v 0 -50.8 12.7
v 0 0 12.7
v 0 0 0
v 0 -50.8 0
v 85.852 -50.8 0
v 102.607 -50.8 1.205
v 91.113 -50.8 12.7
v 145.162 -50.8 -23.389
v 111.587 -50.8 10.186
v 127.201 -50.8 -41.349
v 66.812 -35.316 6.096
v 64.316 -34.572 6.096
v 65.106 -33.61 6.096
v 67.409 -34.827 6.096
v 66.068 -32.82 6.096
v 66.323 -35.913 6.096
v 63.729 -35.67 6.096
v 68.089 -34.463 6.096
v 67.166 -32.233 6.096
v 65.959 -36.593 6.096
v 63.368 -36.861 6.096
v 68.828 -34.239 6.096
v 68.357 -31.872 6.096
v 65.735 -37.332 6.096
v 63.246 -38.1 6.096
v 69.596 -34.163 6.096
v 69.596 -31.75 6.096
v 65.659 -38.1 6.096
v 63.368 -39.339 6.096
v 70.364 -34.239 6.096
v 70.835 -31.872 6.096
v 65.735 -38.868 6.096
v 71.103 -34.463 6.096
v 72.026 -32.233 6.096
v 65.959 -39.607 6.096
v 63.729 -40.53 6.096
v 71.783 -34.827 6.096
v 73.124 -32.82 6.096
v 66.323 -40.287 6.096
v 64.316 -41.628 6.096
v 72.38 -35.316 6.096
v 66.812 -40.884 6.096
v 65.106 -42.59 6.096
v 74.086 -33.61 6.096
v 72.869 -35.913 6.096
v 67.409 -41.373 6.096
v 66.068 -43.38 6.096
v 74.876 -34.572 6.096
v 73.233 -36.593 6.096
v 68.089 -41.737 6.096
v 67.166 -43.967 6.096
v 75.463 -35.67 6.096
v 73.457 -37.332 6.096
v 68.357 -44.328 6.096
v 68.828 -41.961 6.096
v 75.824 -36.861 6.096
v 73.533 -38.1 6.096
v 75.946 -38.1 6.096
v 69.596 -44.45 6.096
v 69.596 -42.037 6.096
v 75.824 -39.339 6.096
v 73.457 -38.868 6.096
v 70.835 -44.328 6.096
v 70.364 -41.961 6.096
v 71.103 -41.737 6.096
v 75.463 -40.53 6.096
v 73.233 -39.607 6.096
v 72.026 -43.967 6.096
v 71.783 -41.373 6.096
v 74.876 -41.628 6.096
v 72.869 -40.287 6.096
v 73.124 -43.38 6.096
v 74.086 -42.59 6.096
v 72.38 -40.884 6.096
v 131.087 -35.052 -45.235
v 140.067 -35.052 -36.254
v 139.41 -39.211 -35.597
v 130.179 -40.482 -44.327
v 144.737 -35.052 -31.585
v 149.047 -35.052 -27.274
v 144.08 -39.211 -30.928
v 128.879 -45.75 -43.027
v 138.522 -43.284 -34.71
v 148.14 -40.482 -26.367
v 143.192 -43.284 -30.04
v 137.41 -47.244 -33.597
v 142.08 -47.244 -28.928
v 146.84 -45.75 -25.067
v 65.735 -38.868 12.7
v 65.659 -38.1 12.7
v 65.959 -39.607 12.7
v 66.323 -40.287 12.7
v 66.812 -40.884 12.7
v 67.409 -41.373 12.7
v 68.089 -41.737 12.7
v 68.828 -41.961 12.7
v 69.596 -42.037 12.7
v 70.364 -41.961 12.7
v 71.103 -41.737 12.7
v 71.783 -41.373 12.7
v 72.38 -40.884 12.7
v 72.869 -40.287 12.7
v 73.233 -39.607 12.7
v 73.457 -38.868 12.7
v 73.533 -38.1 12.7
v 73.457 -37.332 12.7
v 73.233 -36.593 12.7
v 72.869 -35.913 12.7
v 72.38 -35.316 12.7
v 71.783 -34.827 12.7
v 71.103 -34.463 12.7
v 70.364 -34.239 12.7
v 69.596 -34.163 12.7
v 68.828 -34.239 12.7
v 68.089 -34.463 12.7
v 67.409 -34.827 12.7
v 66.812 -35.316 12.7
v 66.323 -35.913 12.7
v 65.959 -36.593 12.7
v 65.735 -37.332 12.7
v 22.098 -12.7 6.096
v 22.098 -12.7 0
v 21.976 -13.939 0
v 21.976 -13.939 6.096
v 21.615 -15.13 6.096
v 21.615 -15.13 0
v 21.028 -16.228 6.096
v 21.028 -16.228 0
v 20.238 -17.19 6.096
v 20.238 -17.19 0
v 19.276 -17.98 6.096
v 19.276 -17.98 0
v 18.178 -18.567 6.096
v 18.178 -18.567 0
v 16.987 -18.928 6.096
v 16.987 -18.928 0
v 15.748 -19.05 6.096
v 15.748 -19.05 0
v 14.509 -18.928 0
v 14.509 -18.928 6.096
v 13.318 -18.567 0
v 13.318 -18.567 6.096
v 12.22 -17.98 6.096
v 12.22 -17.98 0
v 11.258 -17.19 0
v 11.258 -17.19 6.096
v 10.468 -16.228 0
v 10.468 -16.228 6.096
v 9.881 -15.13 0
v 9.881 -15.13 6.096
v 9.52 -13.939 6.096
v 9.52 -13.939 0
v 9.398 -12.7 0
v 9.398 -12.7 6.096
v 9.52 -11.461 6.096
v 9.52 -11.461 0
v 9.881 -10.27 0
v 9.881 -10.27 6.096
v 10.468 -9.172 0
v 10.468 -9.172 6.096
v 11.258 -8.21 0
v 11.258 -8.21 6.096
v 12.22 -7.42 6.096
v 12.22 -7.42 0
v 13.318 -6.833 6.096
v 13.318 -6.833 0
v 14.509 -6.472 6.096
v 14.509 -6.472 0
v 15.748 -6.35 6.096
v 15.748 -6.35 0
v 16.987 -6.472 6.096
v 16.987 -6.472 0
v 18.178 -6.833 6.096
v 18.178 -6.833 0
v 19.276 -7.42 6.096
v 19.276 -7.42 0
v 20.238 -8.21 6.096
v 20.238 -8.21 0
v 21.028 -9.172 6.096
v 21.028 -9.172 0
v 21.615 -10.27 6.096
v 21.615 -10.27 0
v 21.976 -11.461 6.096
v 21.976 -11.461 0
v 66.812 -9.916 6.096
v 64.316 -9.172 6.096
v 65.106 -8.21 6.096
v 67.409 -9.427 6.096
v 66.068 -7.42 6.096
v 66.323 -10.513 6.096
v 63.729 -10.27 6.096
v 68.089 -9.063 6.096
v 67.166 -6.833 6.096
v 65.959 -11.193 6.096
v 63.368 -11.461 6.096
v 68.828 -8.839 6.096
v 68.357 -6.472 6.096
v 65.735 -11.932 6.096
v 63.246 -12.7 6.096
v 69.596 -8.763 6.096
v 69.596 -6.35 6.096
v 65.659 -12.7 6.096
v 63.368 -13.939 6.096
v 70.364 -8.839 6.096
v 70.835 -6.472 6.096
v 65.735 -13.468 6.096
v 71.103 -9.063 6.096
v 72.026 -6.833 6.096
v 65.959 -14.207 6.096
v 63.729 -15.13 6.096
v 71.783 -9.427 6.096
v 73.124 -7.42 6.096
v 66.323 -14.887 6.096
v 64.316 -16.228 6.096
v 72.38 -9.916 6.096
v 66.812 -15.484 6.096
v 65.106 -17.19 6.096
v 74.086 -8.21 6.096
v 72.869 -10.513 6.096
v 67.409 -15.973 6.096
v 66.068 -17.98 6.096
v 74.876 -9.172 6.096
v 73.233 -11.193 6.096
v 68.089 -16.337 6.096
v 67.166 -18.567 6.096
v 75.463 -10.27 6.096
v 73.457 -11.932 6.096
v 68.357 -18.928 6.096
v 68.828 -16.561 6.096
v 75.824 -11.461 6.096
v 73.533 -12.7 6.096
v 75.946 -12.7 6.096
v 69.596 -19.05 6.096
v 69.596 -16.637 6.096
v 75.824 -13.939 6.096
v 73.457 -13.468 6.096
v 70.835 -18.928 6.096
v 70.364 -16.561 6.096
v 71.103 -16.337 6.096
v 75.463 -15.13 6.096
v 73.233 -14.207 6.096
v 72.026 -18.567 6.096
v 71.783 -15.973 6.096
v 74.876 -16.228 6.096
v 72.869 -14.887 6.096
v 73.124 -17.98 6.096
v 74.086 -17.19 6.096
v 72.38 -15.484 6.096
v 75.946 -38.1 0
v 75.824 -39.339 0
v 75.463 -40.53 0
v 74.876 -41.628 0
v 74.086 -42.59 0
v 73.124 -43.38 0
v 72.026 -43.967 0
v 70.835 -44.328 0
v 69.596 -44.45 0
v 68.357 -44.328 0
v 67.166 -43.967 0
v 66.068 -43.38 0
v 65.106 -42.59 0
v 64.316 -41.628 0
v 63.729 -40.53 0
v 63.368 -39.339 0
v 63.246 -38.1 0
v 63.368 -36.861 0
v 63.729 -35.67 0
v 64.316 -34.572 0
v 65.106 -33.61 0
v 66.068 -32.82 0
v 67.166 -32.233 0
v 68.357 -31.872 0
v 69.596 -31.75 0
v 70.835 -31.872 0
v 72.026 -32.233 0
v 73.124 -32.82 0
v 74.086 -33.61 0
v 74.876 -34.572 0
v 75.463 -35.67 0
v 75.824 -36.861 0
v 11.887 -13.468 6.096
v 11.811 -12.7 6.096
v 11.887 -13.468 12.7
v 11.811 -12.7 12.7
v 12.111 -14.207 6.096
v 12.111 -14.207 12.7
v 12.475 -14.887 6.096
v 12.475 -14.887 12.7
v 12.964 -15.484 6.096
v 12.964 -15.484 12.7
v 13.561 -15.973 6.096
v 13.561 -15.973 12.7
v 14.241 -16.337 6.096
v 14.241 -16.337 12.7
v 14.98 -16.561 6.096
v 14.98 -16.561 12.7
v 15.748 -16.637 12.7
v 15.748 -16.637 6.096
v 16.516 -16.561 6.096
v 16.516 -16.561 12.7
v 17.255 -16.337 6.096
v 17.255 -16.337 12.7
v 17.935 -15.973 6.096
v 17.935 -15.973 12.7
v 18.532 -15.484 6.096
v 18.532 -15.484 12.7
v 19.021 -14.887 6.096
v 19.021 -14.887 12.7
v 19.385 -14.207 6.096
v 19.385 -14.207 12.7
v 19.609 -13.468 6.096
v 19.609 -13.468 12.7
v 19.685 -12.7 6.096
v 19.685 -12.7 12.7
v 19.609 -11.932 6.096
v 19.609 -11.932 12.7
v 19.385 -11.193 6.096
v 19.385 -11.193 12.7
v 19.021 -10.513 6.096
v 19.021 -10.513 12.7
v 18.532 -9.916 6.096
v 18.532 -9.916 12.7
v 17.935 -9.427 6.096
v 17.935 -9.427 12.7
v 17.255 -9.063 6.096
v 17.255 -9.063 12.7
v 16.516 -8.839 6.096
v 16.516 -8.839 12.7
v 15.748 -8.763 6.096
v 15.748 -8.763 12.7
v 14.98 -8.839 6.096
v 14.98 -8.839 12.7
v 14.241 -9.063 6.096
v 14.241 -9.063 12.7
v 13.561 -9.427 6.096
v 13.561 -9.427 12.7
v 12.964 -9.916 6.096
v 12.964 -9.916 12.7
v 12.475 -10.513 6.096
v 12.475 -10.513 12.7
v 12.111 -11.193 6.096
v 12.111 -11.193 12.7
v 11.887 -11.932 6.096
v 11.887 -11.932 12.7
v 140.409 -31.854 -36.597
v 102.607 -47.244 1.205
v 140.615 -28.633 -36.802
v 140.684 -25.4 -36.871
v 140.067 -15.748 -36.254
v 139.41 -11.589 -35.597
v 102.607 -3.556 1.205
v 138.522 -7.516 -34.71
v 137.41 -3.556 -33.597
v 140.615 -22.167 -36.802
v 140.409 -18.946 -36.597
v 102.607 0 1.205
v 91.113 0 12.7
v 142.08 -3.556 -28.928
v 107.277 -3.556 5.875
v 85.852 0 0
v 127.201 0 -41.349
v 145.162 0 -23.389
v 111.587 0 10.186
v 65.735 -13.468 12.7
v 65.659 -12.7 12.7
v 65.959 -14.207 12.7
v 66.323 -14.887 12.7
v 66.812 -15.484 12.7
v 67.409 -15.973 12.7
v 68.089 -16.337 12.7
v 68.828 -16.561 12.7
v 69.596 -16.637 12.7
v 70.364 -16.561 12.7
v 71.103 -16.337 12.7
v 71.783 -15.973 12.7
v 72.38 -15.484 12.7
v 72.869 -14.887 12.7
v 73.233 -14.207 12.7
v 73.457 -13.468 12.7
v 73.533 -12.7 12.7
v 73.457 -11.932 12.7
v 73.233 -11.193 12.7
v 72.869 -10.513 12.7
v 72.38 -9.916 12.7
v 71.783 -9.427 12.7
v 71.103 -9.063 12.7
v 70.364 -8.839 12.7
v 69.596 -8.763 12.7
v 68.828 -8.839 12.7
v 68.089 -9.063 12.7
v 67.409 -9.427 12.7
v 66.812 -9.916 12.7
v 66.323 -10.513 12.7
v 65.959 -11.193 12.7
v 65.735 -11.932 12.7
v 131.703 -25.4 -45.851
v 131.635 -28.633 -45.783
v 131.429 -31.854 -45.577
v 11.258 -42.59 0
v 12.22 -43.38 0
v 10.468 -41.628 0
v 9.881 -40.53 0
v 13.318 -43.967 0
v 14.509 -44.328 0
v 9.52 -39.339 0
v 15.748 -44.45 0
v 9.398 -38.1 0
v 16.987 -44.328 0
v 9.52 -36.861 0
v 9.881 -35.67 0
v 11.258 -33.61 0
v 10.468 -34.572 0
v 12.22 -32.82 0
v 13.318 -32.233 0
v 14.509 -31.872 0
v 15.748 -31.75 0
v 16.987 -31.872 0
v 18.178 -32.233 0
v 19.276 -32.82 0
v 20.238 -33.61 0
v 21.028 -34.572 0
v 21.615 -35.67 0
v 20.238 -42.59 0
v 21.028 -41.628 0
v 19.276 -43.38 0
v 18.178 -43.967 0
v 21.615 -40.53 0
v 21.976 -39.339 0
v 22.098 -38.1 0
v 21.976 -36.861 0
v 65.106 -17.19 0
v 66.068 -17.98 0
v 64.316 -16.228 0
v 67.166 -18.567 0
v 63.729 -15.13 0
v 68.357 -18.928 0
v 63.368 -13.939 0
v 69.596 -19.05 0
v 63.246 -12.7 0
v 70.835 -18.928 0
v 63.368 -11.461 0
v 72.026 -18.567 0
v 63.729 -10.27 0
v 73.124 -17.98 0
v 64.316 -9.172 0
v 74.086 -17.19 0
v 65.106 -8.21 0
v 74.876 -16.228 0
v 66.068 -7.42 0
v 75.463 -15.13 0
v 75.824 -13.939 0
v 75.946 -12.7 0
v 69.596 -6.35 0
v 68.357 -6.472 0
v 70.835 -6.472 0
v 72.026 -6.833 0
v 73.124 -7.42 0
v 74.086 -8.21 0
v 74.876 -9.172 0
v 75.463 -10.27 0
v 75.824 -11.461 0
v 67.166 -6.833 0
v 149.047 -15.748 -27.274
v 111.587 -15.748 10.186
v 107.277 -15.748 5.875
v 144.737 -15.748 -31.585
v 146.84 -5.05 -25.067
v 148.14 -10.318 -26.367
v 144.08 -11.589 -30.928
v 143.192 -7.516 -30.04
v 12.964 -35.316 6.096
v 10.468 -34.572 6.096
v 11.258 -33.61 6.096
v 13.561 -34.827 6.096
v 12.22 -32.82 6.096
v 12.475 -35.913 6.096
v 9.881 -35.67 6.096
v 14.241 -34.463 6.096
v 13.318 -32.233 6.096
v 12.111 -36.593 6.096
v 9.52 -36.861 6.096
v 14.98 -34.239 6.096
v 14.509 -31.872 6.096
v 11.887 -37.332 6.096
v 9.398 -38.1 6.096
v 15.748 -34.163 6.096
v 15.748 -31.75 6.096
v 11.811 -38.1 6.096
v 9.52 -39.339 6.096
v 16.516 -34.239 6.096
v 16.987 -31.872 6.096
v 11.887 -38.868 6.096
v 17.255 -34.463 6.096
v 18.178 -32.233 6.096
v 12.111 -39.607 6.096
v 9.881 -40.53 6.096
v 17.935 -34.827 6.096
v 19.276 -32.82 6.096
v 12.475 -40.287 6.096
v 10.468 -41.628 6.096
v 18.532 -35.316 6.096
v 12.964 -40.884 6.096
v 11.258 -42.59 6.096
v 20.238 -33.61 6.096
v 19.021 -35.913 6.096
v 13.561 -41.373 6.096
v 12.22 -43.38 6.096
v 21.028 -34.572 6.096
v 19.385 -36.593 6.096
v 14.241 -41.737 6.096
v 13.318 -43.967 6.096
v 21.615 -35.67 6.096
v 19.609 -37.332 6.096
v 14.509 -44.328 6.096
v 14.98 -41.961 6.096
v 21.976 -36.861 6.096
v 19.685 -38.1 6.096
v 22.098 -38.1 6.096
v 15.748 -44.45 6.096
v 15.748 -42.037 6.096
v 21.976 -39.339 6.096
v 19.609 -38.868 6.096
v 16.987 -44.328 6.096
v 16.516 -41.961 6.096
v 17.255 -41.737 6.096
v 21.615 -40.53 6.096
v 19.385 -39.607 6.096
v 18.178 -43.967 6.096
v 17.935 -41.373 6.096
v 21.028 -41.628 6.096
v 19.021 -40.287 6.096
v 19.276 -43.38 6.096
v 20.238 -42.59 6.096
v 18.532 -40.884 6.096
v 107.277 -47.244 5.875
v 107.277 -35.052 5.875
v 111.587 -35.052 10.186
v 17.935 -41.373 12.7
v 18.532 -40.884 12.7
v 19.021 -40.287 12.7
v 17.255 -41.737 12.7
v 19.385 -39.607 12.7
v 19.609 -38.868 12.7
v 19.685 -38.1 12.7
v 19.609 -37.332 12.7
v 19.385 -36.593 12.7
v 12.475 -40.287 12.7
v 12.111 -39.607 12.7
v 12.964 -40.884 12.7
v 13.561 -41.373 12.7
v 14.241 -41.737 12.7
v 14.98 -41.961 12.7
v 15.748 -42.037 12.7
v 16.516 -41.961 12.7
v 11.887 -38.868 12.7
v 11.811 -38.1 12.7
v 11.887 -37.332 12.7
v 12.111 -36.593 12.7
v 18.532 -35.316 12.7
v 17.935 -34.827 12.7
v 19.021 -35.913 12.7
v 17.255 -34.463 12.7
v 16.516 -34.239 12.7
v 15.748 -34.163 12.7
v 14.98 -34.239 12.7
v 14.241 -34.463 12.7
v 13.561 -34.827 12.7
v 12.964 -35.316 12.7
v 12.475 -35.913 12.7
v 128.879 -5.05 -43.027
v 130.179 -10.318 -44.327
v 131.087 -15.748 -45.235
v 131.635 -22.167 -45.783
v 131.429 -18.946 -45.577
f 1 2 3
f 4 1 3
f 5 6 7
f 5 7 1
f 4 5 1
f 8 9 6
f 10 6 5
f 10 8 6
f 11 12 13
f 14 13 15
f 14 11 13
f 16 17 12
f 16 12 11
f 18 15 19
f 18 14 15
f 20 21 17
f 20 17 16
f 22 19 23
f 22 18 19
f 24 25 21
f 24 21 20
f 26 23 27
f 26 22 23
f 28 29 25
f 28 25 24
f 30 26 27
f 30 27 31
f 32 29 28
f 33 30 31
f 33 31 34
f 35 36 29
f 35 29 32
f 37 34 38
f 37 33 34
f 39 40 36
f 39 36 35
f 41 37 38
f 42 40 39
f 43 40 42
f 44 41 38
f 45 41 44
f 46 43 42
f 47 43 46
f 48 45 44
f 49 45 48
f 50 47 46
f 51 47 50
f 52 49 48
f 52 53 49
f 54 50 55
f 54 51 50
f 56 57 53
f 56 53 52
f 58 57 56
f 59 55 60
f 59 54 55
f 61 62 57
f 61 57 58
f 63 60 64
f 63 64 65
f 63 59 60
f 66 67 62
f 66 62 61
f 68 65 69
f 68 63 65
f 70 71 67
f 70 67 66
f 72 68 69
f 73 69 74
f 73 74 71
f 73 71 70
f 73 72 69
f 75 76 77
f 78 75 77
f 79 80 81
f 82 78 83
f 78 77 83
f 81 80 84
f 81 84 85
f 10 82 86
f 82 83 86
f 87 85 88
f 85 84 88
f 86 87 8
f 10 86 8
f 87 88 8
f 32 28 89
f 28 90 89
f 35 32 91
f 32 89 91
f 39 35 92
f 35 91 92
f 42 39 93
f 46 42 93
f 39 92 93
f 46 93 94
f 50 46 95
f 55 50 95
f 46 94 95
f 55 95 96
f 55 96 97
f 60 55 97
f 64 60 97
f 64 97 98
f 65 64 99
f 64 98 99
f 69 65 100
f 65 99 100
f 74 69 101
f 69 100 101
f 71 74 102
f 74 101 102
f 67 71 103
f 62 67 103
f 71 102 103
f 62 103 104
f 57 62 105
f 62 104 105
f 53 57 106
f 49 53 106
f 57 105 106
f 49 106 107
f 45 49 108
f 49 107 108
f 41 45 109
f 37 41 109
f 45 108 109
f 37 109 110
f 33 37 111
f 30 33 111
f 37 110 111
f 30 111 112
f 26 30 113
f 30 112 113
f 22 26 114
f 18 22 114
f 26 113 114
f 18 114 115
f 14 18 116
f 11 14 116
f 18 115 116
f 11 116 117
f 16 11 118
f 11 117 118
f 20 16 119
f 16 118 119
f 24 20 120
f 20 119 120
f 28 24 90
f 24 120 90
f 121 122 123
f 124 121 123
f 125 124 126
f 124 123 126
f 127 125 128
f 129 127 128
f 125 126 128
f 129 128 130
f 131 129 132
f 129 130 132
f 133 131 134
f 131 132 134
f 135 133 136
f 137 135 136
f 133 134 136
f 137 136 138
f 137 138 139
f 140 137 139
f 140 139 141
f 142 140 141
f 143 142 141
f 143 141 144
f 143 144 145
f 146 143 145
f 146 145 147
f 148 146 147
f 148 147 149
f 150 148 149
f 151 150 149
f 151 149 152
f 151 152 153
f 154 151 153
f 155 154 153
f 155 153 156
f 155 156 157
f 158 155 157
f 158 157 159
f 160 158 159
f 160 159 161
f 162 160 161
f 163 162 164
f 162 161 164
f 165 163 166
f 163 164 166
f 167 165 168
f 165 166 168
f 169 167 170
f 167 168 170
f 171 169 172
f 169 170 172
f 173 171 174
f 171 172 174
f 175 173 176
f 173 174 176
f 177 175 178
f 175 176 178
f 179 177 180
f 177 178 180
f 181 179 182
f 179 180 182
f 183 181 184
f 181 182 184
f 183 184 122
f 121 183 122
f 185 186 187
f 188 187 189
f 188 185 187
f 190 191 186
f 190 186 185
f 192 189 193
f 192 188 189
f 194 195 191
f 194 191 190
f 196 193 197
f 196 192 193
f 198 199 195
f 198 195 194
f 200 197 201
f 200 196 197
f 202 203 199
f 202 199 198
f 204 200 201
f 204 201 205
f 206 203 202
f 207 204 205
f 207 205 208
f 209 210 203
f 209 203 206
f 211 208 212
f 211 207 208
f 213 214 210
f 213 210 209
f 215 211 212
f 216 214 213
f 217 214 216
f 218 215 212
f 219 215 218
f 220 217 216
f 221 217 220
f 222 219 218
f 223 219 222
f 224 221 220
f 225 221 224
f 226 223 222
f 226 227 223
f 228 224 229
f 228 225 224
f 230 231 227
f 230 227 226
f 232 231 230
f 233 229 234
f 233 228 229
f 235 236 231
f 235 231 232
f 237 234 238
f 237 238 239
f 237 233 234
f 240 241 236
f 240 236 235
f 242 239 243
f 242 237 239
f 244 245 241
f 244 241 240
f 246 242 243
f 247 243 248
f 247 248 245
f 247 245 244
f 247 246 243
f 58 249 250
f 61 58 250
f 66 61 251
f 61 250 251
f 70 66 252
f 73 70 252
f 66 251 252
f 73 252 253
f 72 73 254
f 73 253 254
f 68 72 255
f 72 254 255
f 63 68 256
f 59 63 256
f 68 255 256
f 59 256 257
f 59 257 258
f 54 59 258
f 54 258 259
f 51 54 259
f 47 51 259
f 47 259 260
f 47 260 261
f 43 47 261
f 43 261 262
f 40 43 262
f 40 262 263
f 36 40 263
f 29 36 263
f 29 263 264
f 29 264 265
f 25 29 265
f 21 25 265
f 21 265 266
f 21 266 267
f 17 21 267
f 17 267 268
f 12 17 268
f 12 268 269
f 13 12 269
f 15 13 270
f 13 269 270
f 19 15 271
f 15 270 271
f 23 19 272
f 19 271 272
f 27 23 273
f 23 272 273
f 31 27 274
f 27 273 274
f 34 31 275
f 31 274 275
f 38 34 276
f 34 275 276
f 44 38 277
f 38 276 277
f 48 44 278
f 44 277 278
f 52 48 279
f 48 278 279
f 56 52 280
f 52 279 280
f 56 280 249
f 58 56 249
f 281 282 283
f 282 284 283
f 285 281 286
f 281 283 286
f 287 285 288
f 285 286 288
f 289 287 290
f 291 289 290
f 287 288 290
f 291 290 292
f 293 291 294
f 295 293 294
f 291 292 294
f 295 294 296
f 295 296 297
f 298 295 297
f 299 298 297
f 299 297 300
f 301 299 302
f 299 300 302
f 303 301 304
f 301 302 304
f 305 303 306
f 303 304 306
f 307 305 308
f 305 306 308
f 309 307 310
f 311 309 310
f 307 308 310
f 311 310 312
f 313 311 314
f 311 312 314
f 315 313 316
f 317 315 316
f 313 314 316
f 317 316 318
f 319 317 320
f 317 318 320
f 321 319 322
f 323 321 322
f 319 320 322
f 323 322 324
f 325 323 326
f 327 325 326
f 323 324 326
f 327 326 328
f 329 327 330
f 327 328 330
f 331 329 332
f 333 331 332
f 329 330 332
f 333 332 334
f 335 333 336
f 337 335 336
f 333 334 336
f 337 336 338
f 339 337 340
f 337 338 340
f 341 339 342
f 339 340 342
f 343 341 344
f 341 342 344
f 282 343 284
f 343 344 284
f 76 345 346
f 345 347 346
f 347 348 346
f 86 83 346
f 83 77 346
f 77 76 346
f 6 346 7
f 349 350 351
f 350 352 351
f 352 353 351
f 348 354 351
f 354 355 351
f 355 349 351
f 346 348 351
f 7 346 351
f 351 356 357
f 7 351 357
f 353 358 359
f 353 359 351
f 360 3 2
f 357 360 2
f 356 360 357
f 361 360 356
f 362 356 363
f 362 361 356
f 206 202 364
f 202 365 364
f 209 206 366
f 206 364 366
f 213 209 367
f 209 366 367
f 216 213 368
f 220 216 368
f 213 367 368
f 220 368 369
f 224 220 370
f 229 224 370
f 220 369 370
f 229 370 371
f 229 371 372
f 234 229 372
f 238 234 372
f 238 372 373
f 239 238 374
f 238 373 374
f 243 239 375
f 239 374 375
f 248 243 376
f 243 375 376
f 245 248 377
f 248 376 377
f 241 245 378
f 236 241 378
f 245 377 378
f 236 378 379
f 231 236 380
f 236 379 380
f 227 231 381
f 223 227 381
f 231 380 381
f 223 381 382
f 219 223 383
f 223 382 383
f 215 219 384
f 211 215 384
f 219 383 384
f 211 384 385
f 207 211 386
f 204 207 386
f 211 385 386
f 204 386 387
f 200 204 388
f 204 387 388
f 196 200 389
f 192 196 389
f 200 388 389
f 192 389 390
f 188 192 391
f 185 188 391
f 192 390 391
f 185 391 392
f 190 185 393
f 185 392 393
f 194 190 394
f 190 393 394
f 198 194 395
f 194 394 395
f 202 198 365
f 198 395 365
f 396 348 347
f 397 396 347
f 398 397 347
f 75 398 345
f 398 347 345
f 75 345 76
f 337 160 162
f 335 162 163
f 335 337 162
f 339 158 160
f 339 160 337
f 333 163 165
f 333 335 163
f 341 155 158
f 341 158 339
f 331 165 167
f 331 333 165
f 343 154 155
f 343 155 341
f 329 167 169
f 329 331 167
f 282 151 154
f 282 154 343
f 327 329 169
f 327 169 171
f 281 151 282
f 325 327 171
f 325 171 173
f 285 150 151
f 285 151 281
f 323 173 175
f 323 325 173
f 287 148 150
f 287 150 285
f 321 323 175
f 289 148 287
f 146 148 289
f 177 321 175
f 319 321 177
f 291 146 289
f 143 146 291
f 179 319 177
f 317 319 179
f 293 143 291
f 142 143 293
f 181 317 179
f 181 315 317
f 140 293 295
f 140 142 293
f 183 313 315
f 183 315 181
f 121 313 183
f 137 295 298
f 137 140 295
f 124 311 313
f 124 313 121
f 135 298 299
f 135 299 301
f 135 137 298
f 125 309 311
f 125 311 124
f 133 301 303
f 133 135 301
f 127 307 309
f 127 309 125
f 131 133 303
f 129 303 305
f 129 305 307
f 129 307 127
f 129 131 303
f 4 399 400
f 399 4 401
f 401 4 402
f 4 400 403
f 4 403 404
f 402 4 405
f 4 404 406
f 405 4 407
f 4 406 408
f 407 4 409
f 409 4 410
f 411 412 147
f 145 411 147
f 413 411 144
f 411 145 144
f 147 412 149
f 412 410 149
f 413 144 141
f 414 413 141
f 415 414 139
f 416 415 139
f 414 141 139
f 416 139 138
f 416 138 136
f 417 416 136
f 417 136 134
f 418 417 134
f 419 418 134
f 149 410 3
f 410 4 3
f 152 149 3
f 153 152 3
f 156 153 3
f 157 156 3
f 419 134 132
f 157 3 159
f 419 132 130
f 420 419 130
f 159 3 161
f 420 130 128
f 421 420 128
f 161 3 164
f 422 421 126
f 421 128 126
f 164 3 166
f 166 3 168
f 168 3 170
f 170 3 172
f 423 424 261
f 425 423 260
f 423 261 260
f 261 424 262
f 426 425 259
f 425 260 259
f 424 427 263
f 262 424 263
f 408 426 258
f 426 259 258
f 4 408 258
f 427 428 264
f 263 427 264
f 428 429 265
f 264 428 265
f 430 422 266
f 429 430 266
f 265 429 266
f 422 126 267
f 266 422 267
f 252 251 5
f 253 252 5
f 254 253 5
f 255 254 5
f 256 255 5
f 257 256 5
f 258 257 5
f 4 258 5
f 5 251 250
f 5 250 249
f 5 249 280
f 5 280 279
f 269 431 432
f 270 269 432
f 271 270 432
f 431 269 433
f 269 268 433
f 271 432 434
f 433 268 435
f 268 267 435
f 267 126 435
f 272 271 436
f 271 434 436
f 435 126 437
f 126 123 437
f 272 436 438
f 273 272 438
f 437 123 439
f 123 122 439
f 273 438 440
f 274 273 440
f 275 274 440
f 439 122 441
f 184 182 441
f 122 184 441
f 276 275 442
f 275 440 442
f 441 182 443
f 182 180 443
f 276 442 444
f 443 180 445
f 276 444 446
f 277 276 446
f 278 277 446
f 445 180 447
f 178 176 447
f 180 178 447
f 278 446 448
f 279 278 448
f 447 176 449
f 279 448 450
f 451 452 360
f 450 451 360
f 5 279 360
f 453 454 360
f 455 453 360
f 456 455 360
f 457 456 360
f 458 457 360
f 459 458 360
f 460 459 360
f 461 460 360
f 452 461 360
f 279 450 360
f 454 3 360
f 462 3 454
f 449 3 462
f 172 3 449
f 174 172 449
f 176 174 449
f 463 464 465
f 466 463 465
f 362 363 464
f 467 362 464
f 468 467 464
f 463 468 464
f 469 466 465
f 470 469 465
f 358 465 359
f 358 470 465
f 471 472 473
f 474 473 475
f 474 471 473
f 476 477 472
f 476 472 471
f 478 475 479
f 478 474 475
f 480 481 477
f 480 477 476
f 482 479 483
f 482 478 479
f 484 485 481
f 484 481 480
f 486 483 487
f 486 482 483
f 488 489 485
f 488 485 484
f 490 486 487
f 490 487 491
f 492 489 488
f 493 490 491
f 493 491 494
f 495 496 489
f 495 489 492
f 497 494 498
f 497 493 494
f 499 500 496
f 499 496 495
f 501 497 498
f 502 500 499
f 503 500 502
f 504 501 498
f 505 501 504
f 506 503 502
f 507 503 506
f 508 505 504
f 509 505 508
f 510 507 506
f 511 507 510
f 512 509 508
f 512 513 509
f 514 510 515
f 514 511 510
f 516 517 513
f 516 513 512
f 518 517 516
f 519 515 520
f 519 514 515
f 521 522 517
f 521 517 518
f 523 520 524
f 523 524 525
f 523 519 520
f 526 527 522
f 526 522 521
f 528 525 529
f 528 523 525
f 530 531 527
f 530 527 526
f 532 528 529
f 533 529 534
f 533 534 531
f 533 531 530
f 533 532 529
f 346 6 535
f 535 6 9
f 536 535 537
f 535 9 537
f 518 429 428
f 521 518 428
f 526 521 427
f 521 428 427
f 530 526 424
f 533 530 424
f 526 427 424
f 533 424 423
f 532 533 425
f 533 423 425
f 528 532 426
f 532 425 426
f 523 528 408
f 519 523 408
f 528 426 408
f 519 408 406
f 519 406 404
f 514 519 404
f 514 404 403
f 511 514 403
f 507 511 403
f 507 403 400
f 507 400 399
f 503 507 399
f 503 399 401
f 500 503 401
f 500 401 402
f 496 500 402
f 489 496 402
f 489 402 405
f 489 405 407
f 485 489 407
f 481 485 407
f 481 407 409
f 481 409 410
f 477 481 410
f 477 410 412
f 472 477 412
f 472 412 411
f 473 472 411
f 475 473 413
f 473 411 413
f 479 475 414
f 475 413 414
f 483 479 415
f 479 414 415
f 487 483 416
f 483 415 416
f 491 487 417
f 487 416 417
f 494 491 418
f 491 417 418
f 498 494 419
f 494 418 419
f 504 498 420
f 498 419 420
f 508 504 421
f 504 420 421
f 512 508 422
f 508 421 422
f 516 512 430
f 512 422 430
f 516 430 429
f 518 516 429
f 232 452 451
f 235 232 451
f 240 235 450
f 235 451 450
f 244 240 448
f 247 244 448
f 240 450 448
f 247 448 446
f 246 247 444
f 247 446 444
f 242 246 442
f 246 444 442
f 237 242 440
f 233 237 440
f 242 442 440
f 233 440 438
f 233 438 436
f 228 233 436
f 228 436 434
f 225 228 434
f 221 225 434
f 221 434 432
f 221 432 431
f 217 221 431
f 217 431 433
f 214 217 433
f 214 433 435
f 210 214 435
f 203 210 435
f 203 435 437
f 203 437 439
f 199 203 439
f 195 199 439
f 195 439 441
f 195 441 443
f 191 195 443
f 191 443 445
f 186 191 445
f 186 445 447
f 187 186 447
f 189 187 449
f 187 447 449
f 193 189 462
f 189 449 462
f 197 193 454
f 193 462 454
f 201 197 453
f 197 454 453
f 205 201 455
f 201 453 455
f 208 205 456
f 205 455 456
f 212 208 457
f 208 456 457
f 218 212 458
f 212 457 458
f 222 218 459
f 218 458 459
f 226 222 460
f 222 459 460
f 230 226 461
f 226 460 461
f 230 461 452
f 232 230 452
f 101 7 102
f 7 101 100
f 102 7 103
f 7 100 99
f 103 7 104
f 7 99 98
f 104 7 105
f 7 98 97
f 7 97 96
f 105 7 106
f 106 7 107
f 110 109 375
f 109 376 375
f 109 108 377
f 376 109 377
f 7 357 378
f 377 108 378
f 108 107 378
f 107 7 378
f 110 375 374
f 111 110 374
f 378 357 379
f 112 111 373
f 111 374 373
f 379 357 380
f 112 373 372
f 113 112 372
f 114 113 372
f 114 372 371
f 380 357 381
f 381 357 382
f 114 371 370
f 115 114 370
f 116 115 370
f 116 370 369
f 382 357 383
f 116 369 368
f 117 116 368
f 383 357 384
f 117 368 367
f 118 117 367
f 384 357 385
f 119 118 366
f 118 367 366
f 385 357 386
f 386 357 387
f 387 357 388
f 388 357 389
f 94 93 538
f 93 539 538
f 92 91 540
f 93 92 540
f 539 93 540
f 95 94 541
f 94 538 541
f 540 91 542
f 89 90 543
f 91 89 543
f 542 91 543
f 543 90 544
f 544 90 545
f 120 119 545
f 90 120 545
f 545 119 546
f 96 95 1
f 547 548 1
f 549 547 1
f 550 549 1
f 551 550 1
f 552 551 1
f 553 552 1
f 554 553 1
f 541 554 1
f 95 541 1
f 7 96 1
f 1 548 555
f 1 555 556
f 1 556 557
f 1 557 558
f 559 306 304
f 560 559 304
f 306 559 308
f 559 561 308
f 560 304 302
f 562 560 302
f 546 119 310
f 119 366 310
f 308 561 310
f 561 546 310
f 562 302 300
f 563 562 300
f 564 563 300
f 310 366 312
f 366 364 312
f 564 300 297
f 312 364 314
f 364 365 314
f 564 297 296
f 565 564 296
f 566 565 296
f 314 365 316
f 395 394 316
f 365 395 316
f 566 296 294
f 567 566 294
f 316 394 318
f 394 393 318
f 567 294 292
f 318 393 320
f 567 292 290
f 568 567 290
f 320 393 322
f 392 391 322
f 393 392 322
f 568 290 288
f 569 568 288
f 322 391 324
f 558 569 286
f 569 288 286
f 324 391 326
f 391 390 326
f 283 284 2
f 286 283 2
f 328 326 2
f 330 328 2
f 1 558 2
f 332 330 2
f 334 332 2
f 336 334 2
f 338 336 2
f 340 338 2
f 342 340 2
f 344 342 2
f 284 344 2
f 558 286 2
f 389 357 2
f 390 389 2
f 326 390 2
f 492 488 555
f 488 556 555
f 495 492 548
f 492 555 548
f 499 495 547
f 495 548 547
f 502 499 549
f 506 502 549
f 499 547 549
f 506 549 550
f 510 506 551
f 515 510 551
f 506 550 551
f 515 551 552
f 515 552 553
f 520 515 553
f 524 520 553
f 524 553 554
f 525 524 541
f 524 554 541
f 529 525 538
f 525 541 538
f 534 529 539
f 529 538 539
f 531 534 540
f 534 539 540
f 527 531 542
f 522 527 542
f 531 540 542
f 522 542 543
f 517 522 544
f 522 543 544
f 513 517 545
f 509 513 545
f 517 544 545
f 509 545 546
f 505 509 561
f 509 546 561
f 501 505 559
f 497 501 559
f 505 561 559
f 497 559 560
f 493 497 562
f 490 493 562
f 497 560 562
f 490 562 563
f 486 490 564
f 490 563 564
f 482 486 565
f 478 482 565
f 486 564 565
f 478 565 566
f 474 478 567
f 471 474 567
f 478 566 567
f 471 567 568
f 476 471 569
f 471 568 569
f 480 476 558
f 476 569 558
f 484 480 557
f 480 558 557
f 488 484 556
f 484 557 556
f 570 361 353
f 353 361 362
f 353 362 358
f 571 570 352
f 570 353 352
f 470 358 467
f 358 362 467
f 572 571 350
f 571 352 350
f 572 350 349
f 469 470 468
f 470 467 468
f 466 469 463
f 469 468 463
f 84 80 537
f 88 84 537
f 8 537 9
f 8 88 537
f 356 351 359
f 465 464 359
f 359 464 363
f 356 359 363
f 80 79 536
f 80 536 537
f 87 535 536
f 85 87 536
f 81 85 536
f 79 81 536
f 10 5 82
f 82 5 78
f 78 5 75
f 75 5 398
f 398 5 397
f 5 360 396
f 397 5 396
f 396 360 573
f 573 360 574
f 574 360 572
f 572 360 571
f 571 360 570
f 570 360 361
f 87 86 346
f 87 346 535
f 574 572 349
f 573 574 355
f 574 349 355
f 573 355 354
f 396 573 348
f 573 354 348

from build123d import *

# Parameters (mm, degrees)
F1_DEPTH       = 50.8
F3_D           = 7.874
F3_CBORE_D     = 12.7
F3_CBORE_DEPTH = 6.096
F4_D           = 7.874
F4_CBORE_D     = 12.7
F4_CBORE_DEPTH = 6.096
F6_DEPTH       = 53.848
F8_DEPTH       = 53.848
F10_DEPTH      = 25.4


with BuildPart() as f1:
    # F0 (on Front) → F1 (new body)
    with BuildSketch(Plane.XZ):
        Polygon((0, 12.7), (0, 0), (85.852, 0), (131.70327, -45.85127), (140.683526, -36.871014), (91.112512, 12.7), align=None)
    extrude(amount=F1_DEPTH)

    # F3 (through all)
    with Locations(Plane(origin=(0, 0, 0), x_dir=(1, 0, 0), z_dir=(0, 0, -1))):
        with Locations((15.748, 38.1)):
            CounterBoreHole(F3_D / 2, F3_CBORE_D / 2, F3_CBORE_DEPTH)

    # F4 (through all)
    with Locations(Plane(origin=(0, 0, 0), x_dir=(1, 0, 0), z_dir=(0, 0, -1))):
        with Locations((69.596, 38.1), (69.596, 12.7), (15.748, 12.7)):
            CounterBoreHole(F4_D / 2, F4_CBORE_D / 2, F4_CBORE_DEPTH)

    # F5 (on face) → F6 (join)
    with BuildSketch(Plane(origin=(88.77727, 0, -88.77727), x_dir=(0, 1, 0), z_dir=(0.707107, 0, -0.707107))):
        Polygon((-3.556, 73.406531), (0, 73.406531), (0, 86.106531), (-15.748, 86.106531), (-15.748, 80.010531), (-3.556, 80.010531), align=None)
    extrude(amount=-F6_DEPTH)

    # F7 (on face) → F8 (join)
    with BuildSketch(Plane(origin=(88.77727, 0, -88.77727), x_dir=(0, 1, 0), z_dir=(0.707107, 0, -0.707107))):
        Polygon((-50.8, 86.106531), (-50.8, 73.406531), (-47.244, 73.406531), (-47.244, 80.010531), (-35.052, 80.010531), (-35.052, 86.106531), align=None)
    extrude(amount=-F8_DEPTH)

    # F9 (on face) → F10 (cut)
    with BuildSketch(Plane(origin=(60.886512, 0, 60.886512), x_dir=(0.707107, 0, -0.707107), z_dir=(0.707107, 0, 0.707107))):
        with BuildLine():
            Line((125.550019, -35.052), (124.677919, -35.052))
            ThreePointArc((124.677919, -35.052), (122.543911, -43.140042), (119.183037, -50.8))
            Line((119.183037, -50.8), (125.550019, -50.8))
            Line((125.550019, -50.8), (125.550019, -35.052))
        make_face()
        with BuildLine():
            ThreePointArc((124.677919, -15.748), (125.331551, -20.554341), (125.550019, -25.4))
            Line((125.550019, -25.4), (125.550019, -15.748))
            Line((125.550019, -15.748), (124.677919, -15.748))
        make_face()
        with BuildLine():
            Line((125.550019, -35.052), (125.550019, -25.4))
            ThreePointArc((125.550019, -25.4), (125.331551, -30.245659), (124.677919, -35.052))
            Line((124.677919, -35.052), (125.550019, -35.052))
        make_face()
        with BuildLine():
            ThreePointArc((119.183037, 0), (122.543911, -7.659958), (124.677919, -15.748))
            Line((124.677919, -15.748), (125.550019, -15.748))
            Line((125.550019, -15.748), (125.550019, 0))
            Line((125.550019, 0), (119.183037, 0))
        make_face()
    extrude(amount=-F10_DEPTH, mode=Mode.SUBTRACT)


solid = f1.part
